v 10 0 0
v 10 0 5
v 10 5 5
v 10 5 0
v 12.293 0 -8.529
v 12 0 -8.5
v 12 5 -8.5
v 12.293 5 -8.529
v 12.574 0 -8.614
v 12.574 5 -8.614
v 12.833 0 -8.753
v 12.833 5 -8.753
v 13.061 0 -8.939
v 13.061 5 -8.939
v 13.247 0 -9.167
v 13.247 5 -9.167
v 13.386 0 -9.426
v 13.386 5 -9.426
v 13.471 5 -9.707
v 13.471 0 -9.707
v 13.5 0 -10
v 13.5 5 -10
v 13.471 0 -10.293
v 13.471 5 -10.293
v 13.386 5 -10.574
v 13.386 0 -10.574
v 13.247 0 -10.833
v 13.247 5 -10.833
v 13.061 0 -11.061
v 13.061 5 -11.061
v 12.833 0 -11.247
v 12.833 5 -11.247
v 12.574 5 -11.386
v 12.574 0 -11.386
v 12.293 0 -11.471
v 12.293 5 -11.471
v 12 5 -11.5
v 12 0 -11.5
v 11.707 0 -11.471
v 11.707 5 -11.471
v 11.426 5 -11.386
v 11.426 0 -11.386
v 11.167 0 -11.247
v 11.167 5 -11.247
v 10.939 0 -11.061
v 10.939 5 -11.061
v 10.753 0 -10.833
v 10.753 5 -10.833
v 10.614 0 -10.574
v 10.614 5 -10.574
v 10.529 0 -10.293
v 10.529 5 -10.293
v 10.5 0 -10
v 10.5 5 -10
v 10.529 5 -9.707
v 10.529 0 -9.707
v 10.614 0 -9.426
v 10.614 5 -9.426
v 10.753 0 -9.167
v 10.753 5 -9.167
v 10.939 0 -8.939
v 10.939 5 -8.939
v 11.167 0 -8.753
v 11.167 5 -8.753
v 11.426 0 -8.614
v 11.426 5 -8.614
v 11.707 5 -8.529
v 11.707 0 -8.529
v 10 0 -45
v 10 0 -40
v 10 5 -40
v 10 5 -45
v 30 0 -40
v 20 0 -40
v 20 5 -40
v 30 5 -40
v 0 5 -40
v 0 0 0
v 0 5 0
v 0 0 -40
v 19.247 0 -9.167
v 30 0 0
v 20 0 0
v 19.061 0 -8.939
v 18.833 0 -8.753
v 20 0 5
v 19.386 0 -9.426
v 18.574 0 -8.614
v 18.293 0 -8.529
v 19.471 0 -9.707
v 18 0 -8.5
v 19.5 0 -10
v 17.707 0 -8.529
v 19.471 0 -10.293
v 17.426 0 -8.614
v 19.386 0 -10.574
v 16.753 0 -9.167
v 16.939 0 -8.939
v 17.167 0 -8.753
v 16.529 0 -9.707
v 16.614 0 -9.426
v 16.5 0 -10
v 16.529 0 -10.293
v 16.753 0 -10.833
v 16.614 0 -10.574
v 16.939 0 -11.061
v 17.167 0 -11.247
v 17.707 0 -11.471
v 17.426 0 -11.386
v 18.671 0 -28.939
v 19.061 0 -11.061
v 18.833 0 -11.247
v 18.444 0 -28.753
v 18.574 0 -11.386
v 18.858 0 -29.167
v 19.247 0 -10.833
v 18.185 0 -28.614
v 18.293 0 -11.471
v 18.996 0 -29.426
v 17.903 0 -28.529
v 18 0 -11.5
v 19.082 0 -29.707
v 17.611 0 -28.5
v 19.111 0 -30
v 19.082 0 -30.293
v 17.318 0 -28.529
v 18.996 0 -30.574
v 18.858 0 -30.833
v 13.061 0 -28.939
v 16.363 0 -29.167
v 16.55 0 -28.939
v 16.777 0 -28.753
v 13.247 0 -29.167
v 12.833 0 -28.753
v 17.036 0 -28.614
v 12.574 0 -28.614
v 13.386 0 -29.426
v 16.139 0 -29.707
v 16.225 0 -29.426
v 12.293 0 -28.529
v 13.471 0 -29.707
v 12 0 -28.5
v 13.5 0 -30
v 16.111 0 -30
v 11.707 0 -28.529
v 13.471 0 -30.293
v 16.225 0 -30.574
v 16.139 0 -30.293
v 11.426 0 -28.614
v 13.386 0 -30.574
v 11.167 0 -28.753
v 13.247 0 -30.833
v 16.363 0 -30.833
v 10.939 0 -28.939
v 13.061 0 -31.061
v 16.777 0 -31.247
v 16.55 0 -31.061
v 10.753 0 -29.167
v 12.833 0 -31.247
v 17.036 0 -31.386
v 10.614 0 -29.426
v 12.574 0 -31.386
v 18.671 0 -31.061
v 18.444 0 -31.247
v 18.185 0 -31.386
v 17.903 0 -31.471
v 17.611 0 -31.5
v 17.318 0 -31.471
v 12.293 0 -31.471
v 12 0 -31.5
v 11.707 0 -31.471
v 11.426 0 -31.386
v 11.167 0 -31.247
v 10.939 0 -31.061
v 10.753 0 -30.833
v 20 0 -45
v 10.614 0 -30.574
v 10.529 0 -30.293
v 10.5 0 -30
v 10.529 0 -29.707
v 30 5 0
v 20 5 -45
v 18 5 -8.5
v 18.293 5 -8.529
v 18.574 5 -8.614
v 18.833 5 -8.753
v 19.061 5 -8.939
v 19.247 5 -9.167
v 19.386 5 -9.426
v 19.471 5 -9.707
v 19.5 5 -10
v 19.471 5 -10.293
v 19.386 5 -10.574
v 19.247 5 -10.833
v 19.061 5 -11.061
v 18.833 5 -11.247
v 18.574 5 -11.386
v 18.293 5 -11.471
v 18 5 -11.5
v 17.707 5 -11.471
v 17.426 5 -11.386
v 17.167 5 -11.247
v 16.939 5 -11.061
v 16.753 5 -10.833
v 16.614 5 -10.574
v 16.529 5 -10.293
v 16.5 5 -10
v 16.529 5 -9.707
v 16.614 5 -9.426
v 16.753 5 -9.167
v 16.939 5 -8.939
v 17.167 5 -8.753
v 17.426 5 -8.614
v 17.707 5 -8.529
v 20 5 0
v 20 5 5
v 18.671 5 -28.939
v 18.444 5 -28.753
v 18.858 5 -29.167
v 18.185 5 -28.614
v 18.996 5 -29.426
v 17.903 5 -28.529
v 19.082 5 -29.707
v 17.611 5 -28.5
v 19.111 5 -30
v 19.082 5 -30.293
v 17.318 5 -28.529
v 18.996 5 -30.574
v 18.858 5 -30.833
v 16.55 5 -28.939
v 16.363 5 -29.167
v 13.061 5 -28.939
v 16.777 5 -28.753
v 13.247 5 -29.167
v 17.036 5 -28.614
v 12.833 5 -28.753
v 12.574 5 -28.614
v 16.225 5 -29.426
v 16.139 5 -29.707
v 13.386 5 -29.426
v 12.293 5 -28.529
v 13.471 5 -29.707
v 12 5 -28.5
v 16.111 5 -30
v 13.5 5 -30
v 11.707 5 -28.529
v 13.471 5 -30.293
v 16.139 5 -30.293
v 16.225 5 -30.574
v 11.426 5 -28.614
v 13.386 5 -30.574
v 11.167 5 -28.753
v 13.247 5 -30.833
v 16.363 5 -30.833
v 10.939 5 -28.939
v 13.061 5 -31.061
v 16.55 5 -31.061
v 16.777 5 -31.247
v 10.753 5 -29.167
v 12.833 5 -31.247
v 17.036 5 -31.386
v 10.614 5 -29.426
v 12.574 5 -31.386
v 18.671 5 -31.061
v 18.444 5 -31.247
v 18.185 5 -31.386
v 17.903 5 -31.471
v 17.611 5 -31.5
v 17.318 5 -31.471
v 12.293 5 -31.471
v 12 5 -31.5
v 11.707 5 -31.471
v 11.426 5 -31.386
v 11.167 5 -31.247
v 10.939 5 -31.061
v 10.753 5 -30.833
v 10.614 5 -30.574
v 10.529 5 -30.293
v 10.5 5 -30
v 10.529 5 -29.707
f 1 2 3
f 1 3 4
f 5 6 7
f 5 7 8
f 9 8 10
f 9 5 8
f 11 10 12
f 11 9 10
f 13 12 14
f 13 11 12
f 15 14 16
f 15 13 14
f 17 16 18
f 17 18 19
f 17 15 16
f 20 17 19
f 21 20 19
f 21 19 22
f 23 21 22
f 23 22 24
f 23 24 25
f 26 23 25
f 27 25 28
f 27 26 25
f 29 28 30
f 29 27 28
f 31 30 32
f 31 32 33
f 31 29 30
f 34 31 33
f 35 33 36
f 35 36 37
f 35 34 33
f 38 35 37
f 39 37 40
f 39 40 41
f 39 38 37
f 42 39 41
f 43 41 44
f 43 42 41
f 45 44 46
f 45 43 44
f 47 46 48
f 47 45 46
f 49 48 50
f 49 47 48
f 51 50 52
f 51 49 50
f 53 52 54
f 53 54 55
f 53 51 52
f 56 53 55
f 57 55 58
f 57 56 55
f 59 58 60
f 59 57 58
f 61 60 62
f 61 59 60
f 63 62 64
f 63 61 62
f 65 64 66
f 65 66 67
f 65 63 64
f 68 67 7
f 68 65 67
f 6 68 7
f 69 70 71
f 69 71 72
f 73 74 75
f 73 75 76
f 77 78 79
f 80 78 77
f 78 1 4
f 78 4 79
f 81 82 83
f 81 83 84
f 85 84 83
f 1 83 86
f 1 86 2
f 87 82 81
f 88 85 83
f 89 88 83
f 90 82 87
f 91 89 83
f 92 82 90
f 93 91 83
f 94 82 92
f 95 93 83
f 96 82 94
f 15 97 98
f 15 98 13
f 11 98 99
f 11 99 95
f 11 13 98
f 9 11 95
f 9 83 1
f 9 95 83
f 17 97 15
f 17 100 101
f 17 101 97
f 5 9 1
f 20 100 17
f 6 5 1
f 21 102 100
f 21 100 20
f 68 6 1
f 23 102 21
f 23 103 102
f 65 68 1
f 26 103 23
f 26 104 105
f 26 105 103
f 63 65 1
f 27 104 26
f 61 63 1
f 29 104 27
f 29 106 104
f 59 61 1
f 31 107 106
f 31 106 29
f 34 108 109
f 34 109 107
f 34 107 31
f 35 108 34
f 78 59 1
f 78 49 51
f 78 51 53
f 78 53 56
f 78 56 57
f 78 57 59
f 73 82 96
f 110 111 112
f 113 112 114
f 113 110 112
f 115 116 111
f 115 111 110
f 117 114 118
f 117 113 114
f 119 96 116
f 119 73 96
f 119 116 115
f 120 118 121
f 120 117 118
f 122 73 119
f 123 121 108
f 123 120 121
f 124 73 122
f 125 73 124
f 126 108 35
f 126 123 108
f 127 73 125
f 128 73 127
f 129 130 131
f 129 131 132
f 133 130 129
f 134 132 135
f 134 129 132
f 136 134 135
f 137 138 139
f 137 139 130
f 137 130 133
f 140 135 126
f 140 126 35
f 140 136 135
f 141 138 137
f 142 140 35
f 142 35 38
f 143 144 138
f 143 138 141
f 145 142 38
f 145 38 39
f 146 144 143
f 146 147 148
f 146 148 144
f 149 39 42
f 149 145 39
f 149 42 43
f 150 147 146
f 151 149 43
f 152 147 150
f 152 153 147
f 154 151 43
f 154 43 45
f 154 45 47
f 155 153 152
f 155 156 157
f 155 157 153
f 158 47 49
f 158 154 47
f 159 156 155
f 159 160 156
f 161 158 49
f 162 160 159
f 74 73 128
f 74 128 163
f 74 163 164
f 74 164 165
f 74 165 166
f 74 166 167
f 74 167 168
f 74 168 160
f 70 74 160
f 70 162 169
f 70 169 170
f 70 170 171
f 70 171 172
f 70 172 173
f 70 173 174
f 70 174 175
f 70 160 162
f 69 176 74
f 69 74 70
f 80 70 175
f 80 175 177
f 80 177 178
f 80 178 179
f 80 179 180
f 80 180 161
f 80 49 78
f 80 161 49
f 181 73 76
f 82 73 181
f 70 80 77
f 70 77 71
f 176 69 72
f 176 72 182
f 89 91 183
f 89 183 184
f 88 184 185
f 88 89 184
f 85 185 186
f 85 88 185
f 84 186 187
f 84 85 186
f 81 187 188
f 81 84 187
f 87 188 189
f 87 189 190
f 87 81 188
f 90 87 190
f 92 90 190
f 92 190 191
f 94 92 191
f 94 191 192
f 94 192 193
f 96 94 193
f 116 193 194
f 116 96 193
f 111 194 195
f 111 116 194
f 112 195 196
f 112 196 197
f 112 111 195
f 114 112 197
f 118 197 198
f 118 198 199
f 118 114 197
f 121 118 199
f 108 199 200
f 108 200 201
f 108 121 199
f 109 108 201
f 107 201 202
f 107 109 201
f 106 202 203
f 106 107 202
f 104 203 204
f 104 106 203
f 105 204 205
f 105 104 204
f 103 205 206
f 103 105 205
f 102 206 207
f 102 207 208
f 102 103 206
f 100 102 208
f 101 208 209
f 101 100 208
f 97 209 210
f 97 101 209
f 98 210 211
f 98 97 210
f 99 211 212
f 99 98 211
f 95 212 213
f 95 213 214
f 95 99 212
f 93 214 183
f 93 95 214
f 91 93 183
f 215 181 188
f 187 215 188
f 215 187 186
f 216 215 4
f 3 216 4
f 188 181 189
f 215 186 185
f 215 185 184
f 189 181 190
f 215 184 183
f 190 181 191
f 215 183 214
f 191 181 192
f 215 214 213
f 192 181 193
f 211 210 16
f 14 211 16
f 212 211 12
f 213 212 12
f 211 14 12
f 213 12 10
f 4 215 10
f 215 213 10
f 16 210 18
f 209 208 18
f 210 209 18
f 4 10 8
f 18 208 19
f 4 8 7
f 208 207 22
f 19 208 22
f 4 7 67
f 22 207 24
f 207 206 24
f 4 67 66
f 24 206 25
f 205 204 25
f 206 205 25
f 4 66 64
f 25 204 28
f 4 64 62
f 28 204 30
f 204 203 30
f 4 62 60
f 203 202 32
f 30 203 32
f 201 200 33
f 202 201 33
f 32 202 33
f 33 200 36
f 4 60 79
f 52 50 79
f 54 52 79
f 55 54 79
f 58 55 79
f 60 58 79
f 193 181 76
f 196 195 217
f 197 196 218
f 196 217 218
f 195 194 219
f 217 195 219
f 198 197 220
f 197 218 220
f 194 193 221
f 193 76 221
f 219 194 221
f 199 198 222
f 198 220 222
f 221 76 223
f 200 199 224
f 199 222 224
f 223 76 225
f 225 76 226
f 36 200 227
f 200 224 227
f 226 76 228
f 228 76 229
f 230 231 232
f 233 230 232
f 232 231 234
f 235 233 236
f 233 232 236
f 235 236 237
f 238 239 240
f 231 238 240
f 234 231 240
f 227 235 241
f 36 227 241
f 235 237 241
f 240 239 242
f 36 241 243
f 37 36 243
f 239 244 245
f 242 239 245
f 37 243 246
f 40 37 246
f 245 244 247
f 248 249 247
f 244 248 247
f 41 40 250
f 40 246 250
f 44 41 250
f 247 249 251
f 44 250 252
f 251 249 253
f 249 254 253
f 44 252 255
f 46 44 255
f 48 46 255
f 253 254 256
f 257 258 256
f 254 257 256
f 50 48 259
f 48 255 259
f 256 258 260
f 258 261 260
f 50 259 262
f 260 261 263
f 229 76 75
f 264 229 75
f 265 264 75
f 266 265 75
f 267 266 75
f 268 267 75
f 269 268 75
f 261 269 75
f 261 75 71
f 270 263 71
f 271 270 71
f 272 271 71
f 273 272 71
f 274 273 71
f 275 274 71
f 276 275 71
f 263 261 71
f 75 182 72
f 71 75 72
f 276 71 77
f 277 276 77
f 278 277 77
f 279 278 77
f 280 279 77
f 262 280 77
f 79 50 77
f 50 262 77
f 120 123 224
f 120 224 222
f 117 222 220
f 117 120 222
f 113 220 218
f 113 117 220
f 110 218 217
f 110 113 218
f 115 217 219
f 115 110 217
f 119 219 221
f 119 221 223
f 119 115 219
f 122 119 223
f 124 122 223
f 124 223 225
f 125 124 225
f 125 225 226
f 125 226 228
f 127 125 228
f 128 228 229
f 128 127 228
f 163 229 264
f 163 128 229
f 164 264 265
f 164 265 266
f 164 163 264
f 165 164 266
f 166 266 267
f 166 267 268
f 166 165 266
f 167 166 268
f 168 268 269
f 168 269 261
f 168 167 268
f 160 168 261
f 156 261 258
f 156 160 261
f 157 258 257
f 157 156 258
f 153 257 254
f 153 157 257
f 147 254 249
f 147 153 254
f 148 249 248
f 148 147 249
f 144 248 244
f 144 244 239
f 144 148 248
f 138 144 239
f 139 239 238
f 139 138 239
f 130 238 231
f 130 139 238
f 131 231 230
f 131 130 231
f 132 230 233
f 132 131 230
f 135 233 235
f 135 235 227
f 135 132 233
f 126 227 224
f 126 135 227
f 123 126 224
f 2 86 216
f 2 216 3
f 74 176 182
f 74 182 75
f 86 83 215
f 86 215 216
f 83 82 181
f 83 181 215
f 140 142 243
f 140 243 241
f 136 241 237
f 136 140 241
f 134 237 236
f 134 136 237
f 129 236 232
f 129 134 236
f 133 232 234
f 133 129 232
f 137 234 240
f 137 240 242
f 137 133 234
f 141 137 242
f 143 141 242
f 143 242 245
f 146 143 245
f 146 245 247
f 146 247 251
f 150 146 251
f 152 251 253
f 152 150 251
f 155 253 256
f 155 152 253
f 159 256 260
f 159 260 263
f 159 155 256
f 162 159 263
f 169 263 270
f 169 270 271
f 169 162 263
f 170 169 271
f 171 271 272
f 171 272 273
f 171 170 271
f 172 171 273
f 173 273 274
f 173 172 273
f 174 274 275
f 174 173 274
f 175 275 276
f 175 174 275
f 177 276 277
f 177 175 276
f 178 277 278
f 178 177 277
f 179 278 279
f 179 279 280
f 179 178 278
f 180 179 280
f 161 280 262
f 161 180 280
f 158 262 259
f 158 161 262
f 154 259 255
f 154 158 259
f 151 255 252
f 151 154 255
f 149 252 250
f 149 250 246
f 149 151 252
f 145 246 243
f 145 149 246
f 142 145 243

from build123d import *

# Parameters (mm, degrees)
SKETCH_1_R      = 1.5
EXTRUDE_1_DEPTH = 5


with BuildPart() as part:
    # 草图1 → 凸台-拉伸1 (new body)
    with BuildSketch(Plane(origin=(0, 0, 0), x_dir=(1, 0, 0), z_dir=(0, 1, 0))):
        Polygon((20, 40), (30, 40), (30, 0), (20, 0), (20, -5), (10, -5), (10, 0), (0, 0), (0, 40), (10, 40), (10, 45), (20, 45), align=None)
        with Locations(Location((12, 30, 0), (0, 0, 270))):
            Circle(SKETCH_1_R, mode=Mode.SUBTRACT)
        with Locations(Location((17.61050347, 30, 0), (0, 0, 270))):
            Circle(SKETCH_1_R, mode=Mode.SUBTRACT)
        with Locations(Location((18, 10, 0), (0, 0, 270))):
            Circle(SKETCH_1_R, mode=Mode.SUBTRACT)
        with Locations(Location((12, 10, 0), (0, 0, 270))):
            Circle(SKETCH_1_R, mode=Mode.SUBTRACT)
    extrude(amount=EXTRUDE_1_DEPTH)


solid = part.part
